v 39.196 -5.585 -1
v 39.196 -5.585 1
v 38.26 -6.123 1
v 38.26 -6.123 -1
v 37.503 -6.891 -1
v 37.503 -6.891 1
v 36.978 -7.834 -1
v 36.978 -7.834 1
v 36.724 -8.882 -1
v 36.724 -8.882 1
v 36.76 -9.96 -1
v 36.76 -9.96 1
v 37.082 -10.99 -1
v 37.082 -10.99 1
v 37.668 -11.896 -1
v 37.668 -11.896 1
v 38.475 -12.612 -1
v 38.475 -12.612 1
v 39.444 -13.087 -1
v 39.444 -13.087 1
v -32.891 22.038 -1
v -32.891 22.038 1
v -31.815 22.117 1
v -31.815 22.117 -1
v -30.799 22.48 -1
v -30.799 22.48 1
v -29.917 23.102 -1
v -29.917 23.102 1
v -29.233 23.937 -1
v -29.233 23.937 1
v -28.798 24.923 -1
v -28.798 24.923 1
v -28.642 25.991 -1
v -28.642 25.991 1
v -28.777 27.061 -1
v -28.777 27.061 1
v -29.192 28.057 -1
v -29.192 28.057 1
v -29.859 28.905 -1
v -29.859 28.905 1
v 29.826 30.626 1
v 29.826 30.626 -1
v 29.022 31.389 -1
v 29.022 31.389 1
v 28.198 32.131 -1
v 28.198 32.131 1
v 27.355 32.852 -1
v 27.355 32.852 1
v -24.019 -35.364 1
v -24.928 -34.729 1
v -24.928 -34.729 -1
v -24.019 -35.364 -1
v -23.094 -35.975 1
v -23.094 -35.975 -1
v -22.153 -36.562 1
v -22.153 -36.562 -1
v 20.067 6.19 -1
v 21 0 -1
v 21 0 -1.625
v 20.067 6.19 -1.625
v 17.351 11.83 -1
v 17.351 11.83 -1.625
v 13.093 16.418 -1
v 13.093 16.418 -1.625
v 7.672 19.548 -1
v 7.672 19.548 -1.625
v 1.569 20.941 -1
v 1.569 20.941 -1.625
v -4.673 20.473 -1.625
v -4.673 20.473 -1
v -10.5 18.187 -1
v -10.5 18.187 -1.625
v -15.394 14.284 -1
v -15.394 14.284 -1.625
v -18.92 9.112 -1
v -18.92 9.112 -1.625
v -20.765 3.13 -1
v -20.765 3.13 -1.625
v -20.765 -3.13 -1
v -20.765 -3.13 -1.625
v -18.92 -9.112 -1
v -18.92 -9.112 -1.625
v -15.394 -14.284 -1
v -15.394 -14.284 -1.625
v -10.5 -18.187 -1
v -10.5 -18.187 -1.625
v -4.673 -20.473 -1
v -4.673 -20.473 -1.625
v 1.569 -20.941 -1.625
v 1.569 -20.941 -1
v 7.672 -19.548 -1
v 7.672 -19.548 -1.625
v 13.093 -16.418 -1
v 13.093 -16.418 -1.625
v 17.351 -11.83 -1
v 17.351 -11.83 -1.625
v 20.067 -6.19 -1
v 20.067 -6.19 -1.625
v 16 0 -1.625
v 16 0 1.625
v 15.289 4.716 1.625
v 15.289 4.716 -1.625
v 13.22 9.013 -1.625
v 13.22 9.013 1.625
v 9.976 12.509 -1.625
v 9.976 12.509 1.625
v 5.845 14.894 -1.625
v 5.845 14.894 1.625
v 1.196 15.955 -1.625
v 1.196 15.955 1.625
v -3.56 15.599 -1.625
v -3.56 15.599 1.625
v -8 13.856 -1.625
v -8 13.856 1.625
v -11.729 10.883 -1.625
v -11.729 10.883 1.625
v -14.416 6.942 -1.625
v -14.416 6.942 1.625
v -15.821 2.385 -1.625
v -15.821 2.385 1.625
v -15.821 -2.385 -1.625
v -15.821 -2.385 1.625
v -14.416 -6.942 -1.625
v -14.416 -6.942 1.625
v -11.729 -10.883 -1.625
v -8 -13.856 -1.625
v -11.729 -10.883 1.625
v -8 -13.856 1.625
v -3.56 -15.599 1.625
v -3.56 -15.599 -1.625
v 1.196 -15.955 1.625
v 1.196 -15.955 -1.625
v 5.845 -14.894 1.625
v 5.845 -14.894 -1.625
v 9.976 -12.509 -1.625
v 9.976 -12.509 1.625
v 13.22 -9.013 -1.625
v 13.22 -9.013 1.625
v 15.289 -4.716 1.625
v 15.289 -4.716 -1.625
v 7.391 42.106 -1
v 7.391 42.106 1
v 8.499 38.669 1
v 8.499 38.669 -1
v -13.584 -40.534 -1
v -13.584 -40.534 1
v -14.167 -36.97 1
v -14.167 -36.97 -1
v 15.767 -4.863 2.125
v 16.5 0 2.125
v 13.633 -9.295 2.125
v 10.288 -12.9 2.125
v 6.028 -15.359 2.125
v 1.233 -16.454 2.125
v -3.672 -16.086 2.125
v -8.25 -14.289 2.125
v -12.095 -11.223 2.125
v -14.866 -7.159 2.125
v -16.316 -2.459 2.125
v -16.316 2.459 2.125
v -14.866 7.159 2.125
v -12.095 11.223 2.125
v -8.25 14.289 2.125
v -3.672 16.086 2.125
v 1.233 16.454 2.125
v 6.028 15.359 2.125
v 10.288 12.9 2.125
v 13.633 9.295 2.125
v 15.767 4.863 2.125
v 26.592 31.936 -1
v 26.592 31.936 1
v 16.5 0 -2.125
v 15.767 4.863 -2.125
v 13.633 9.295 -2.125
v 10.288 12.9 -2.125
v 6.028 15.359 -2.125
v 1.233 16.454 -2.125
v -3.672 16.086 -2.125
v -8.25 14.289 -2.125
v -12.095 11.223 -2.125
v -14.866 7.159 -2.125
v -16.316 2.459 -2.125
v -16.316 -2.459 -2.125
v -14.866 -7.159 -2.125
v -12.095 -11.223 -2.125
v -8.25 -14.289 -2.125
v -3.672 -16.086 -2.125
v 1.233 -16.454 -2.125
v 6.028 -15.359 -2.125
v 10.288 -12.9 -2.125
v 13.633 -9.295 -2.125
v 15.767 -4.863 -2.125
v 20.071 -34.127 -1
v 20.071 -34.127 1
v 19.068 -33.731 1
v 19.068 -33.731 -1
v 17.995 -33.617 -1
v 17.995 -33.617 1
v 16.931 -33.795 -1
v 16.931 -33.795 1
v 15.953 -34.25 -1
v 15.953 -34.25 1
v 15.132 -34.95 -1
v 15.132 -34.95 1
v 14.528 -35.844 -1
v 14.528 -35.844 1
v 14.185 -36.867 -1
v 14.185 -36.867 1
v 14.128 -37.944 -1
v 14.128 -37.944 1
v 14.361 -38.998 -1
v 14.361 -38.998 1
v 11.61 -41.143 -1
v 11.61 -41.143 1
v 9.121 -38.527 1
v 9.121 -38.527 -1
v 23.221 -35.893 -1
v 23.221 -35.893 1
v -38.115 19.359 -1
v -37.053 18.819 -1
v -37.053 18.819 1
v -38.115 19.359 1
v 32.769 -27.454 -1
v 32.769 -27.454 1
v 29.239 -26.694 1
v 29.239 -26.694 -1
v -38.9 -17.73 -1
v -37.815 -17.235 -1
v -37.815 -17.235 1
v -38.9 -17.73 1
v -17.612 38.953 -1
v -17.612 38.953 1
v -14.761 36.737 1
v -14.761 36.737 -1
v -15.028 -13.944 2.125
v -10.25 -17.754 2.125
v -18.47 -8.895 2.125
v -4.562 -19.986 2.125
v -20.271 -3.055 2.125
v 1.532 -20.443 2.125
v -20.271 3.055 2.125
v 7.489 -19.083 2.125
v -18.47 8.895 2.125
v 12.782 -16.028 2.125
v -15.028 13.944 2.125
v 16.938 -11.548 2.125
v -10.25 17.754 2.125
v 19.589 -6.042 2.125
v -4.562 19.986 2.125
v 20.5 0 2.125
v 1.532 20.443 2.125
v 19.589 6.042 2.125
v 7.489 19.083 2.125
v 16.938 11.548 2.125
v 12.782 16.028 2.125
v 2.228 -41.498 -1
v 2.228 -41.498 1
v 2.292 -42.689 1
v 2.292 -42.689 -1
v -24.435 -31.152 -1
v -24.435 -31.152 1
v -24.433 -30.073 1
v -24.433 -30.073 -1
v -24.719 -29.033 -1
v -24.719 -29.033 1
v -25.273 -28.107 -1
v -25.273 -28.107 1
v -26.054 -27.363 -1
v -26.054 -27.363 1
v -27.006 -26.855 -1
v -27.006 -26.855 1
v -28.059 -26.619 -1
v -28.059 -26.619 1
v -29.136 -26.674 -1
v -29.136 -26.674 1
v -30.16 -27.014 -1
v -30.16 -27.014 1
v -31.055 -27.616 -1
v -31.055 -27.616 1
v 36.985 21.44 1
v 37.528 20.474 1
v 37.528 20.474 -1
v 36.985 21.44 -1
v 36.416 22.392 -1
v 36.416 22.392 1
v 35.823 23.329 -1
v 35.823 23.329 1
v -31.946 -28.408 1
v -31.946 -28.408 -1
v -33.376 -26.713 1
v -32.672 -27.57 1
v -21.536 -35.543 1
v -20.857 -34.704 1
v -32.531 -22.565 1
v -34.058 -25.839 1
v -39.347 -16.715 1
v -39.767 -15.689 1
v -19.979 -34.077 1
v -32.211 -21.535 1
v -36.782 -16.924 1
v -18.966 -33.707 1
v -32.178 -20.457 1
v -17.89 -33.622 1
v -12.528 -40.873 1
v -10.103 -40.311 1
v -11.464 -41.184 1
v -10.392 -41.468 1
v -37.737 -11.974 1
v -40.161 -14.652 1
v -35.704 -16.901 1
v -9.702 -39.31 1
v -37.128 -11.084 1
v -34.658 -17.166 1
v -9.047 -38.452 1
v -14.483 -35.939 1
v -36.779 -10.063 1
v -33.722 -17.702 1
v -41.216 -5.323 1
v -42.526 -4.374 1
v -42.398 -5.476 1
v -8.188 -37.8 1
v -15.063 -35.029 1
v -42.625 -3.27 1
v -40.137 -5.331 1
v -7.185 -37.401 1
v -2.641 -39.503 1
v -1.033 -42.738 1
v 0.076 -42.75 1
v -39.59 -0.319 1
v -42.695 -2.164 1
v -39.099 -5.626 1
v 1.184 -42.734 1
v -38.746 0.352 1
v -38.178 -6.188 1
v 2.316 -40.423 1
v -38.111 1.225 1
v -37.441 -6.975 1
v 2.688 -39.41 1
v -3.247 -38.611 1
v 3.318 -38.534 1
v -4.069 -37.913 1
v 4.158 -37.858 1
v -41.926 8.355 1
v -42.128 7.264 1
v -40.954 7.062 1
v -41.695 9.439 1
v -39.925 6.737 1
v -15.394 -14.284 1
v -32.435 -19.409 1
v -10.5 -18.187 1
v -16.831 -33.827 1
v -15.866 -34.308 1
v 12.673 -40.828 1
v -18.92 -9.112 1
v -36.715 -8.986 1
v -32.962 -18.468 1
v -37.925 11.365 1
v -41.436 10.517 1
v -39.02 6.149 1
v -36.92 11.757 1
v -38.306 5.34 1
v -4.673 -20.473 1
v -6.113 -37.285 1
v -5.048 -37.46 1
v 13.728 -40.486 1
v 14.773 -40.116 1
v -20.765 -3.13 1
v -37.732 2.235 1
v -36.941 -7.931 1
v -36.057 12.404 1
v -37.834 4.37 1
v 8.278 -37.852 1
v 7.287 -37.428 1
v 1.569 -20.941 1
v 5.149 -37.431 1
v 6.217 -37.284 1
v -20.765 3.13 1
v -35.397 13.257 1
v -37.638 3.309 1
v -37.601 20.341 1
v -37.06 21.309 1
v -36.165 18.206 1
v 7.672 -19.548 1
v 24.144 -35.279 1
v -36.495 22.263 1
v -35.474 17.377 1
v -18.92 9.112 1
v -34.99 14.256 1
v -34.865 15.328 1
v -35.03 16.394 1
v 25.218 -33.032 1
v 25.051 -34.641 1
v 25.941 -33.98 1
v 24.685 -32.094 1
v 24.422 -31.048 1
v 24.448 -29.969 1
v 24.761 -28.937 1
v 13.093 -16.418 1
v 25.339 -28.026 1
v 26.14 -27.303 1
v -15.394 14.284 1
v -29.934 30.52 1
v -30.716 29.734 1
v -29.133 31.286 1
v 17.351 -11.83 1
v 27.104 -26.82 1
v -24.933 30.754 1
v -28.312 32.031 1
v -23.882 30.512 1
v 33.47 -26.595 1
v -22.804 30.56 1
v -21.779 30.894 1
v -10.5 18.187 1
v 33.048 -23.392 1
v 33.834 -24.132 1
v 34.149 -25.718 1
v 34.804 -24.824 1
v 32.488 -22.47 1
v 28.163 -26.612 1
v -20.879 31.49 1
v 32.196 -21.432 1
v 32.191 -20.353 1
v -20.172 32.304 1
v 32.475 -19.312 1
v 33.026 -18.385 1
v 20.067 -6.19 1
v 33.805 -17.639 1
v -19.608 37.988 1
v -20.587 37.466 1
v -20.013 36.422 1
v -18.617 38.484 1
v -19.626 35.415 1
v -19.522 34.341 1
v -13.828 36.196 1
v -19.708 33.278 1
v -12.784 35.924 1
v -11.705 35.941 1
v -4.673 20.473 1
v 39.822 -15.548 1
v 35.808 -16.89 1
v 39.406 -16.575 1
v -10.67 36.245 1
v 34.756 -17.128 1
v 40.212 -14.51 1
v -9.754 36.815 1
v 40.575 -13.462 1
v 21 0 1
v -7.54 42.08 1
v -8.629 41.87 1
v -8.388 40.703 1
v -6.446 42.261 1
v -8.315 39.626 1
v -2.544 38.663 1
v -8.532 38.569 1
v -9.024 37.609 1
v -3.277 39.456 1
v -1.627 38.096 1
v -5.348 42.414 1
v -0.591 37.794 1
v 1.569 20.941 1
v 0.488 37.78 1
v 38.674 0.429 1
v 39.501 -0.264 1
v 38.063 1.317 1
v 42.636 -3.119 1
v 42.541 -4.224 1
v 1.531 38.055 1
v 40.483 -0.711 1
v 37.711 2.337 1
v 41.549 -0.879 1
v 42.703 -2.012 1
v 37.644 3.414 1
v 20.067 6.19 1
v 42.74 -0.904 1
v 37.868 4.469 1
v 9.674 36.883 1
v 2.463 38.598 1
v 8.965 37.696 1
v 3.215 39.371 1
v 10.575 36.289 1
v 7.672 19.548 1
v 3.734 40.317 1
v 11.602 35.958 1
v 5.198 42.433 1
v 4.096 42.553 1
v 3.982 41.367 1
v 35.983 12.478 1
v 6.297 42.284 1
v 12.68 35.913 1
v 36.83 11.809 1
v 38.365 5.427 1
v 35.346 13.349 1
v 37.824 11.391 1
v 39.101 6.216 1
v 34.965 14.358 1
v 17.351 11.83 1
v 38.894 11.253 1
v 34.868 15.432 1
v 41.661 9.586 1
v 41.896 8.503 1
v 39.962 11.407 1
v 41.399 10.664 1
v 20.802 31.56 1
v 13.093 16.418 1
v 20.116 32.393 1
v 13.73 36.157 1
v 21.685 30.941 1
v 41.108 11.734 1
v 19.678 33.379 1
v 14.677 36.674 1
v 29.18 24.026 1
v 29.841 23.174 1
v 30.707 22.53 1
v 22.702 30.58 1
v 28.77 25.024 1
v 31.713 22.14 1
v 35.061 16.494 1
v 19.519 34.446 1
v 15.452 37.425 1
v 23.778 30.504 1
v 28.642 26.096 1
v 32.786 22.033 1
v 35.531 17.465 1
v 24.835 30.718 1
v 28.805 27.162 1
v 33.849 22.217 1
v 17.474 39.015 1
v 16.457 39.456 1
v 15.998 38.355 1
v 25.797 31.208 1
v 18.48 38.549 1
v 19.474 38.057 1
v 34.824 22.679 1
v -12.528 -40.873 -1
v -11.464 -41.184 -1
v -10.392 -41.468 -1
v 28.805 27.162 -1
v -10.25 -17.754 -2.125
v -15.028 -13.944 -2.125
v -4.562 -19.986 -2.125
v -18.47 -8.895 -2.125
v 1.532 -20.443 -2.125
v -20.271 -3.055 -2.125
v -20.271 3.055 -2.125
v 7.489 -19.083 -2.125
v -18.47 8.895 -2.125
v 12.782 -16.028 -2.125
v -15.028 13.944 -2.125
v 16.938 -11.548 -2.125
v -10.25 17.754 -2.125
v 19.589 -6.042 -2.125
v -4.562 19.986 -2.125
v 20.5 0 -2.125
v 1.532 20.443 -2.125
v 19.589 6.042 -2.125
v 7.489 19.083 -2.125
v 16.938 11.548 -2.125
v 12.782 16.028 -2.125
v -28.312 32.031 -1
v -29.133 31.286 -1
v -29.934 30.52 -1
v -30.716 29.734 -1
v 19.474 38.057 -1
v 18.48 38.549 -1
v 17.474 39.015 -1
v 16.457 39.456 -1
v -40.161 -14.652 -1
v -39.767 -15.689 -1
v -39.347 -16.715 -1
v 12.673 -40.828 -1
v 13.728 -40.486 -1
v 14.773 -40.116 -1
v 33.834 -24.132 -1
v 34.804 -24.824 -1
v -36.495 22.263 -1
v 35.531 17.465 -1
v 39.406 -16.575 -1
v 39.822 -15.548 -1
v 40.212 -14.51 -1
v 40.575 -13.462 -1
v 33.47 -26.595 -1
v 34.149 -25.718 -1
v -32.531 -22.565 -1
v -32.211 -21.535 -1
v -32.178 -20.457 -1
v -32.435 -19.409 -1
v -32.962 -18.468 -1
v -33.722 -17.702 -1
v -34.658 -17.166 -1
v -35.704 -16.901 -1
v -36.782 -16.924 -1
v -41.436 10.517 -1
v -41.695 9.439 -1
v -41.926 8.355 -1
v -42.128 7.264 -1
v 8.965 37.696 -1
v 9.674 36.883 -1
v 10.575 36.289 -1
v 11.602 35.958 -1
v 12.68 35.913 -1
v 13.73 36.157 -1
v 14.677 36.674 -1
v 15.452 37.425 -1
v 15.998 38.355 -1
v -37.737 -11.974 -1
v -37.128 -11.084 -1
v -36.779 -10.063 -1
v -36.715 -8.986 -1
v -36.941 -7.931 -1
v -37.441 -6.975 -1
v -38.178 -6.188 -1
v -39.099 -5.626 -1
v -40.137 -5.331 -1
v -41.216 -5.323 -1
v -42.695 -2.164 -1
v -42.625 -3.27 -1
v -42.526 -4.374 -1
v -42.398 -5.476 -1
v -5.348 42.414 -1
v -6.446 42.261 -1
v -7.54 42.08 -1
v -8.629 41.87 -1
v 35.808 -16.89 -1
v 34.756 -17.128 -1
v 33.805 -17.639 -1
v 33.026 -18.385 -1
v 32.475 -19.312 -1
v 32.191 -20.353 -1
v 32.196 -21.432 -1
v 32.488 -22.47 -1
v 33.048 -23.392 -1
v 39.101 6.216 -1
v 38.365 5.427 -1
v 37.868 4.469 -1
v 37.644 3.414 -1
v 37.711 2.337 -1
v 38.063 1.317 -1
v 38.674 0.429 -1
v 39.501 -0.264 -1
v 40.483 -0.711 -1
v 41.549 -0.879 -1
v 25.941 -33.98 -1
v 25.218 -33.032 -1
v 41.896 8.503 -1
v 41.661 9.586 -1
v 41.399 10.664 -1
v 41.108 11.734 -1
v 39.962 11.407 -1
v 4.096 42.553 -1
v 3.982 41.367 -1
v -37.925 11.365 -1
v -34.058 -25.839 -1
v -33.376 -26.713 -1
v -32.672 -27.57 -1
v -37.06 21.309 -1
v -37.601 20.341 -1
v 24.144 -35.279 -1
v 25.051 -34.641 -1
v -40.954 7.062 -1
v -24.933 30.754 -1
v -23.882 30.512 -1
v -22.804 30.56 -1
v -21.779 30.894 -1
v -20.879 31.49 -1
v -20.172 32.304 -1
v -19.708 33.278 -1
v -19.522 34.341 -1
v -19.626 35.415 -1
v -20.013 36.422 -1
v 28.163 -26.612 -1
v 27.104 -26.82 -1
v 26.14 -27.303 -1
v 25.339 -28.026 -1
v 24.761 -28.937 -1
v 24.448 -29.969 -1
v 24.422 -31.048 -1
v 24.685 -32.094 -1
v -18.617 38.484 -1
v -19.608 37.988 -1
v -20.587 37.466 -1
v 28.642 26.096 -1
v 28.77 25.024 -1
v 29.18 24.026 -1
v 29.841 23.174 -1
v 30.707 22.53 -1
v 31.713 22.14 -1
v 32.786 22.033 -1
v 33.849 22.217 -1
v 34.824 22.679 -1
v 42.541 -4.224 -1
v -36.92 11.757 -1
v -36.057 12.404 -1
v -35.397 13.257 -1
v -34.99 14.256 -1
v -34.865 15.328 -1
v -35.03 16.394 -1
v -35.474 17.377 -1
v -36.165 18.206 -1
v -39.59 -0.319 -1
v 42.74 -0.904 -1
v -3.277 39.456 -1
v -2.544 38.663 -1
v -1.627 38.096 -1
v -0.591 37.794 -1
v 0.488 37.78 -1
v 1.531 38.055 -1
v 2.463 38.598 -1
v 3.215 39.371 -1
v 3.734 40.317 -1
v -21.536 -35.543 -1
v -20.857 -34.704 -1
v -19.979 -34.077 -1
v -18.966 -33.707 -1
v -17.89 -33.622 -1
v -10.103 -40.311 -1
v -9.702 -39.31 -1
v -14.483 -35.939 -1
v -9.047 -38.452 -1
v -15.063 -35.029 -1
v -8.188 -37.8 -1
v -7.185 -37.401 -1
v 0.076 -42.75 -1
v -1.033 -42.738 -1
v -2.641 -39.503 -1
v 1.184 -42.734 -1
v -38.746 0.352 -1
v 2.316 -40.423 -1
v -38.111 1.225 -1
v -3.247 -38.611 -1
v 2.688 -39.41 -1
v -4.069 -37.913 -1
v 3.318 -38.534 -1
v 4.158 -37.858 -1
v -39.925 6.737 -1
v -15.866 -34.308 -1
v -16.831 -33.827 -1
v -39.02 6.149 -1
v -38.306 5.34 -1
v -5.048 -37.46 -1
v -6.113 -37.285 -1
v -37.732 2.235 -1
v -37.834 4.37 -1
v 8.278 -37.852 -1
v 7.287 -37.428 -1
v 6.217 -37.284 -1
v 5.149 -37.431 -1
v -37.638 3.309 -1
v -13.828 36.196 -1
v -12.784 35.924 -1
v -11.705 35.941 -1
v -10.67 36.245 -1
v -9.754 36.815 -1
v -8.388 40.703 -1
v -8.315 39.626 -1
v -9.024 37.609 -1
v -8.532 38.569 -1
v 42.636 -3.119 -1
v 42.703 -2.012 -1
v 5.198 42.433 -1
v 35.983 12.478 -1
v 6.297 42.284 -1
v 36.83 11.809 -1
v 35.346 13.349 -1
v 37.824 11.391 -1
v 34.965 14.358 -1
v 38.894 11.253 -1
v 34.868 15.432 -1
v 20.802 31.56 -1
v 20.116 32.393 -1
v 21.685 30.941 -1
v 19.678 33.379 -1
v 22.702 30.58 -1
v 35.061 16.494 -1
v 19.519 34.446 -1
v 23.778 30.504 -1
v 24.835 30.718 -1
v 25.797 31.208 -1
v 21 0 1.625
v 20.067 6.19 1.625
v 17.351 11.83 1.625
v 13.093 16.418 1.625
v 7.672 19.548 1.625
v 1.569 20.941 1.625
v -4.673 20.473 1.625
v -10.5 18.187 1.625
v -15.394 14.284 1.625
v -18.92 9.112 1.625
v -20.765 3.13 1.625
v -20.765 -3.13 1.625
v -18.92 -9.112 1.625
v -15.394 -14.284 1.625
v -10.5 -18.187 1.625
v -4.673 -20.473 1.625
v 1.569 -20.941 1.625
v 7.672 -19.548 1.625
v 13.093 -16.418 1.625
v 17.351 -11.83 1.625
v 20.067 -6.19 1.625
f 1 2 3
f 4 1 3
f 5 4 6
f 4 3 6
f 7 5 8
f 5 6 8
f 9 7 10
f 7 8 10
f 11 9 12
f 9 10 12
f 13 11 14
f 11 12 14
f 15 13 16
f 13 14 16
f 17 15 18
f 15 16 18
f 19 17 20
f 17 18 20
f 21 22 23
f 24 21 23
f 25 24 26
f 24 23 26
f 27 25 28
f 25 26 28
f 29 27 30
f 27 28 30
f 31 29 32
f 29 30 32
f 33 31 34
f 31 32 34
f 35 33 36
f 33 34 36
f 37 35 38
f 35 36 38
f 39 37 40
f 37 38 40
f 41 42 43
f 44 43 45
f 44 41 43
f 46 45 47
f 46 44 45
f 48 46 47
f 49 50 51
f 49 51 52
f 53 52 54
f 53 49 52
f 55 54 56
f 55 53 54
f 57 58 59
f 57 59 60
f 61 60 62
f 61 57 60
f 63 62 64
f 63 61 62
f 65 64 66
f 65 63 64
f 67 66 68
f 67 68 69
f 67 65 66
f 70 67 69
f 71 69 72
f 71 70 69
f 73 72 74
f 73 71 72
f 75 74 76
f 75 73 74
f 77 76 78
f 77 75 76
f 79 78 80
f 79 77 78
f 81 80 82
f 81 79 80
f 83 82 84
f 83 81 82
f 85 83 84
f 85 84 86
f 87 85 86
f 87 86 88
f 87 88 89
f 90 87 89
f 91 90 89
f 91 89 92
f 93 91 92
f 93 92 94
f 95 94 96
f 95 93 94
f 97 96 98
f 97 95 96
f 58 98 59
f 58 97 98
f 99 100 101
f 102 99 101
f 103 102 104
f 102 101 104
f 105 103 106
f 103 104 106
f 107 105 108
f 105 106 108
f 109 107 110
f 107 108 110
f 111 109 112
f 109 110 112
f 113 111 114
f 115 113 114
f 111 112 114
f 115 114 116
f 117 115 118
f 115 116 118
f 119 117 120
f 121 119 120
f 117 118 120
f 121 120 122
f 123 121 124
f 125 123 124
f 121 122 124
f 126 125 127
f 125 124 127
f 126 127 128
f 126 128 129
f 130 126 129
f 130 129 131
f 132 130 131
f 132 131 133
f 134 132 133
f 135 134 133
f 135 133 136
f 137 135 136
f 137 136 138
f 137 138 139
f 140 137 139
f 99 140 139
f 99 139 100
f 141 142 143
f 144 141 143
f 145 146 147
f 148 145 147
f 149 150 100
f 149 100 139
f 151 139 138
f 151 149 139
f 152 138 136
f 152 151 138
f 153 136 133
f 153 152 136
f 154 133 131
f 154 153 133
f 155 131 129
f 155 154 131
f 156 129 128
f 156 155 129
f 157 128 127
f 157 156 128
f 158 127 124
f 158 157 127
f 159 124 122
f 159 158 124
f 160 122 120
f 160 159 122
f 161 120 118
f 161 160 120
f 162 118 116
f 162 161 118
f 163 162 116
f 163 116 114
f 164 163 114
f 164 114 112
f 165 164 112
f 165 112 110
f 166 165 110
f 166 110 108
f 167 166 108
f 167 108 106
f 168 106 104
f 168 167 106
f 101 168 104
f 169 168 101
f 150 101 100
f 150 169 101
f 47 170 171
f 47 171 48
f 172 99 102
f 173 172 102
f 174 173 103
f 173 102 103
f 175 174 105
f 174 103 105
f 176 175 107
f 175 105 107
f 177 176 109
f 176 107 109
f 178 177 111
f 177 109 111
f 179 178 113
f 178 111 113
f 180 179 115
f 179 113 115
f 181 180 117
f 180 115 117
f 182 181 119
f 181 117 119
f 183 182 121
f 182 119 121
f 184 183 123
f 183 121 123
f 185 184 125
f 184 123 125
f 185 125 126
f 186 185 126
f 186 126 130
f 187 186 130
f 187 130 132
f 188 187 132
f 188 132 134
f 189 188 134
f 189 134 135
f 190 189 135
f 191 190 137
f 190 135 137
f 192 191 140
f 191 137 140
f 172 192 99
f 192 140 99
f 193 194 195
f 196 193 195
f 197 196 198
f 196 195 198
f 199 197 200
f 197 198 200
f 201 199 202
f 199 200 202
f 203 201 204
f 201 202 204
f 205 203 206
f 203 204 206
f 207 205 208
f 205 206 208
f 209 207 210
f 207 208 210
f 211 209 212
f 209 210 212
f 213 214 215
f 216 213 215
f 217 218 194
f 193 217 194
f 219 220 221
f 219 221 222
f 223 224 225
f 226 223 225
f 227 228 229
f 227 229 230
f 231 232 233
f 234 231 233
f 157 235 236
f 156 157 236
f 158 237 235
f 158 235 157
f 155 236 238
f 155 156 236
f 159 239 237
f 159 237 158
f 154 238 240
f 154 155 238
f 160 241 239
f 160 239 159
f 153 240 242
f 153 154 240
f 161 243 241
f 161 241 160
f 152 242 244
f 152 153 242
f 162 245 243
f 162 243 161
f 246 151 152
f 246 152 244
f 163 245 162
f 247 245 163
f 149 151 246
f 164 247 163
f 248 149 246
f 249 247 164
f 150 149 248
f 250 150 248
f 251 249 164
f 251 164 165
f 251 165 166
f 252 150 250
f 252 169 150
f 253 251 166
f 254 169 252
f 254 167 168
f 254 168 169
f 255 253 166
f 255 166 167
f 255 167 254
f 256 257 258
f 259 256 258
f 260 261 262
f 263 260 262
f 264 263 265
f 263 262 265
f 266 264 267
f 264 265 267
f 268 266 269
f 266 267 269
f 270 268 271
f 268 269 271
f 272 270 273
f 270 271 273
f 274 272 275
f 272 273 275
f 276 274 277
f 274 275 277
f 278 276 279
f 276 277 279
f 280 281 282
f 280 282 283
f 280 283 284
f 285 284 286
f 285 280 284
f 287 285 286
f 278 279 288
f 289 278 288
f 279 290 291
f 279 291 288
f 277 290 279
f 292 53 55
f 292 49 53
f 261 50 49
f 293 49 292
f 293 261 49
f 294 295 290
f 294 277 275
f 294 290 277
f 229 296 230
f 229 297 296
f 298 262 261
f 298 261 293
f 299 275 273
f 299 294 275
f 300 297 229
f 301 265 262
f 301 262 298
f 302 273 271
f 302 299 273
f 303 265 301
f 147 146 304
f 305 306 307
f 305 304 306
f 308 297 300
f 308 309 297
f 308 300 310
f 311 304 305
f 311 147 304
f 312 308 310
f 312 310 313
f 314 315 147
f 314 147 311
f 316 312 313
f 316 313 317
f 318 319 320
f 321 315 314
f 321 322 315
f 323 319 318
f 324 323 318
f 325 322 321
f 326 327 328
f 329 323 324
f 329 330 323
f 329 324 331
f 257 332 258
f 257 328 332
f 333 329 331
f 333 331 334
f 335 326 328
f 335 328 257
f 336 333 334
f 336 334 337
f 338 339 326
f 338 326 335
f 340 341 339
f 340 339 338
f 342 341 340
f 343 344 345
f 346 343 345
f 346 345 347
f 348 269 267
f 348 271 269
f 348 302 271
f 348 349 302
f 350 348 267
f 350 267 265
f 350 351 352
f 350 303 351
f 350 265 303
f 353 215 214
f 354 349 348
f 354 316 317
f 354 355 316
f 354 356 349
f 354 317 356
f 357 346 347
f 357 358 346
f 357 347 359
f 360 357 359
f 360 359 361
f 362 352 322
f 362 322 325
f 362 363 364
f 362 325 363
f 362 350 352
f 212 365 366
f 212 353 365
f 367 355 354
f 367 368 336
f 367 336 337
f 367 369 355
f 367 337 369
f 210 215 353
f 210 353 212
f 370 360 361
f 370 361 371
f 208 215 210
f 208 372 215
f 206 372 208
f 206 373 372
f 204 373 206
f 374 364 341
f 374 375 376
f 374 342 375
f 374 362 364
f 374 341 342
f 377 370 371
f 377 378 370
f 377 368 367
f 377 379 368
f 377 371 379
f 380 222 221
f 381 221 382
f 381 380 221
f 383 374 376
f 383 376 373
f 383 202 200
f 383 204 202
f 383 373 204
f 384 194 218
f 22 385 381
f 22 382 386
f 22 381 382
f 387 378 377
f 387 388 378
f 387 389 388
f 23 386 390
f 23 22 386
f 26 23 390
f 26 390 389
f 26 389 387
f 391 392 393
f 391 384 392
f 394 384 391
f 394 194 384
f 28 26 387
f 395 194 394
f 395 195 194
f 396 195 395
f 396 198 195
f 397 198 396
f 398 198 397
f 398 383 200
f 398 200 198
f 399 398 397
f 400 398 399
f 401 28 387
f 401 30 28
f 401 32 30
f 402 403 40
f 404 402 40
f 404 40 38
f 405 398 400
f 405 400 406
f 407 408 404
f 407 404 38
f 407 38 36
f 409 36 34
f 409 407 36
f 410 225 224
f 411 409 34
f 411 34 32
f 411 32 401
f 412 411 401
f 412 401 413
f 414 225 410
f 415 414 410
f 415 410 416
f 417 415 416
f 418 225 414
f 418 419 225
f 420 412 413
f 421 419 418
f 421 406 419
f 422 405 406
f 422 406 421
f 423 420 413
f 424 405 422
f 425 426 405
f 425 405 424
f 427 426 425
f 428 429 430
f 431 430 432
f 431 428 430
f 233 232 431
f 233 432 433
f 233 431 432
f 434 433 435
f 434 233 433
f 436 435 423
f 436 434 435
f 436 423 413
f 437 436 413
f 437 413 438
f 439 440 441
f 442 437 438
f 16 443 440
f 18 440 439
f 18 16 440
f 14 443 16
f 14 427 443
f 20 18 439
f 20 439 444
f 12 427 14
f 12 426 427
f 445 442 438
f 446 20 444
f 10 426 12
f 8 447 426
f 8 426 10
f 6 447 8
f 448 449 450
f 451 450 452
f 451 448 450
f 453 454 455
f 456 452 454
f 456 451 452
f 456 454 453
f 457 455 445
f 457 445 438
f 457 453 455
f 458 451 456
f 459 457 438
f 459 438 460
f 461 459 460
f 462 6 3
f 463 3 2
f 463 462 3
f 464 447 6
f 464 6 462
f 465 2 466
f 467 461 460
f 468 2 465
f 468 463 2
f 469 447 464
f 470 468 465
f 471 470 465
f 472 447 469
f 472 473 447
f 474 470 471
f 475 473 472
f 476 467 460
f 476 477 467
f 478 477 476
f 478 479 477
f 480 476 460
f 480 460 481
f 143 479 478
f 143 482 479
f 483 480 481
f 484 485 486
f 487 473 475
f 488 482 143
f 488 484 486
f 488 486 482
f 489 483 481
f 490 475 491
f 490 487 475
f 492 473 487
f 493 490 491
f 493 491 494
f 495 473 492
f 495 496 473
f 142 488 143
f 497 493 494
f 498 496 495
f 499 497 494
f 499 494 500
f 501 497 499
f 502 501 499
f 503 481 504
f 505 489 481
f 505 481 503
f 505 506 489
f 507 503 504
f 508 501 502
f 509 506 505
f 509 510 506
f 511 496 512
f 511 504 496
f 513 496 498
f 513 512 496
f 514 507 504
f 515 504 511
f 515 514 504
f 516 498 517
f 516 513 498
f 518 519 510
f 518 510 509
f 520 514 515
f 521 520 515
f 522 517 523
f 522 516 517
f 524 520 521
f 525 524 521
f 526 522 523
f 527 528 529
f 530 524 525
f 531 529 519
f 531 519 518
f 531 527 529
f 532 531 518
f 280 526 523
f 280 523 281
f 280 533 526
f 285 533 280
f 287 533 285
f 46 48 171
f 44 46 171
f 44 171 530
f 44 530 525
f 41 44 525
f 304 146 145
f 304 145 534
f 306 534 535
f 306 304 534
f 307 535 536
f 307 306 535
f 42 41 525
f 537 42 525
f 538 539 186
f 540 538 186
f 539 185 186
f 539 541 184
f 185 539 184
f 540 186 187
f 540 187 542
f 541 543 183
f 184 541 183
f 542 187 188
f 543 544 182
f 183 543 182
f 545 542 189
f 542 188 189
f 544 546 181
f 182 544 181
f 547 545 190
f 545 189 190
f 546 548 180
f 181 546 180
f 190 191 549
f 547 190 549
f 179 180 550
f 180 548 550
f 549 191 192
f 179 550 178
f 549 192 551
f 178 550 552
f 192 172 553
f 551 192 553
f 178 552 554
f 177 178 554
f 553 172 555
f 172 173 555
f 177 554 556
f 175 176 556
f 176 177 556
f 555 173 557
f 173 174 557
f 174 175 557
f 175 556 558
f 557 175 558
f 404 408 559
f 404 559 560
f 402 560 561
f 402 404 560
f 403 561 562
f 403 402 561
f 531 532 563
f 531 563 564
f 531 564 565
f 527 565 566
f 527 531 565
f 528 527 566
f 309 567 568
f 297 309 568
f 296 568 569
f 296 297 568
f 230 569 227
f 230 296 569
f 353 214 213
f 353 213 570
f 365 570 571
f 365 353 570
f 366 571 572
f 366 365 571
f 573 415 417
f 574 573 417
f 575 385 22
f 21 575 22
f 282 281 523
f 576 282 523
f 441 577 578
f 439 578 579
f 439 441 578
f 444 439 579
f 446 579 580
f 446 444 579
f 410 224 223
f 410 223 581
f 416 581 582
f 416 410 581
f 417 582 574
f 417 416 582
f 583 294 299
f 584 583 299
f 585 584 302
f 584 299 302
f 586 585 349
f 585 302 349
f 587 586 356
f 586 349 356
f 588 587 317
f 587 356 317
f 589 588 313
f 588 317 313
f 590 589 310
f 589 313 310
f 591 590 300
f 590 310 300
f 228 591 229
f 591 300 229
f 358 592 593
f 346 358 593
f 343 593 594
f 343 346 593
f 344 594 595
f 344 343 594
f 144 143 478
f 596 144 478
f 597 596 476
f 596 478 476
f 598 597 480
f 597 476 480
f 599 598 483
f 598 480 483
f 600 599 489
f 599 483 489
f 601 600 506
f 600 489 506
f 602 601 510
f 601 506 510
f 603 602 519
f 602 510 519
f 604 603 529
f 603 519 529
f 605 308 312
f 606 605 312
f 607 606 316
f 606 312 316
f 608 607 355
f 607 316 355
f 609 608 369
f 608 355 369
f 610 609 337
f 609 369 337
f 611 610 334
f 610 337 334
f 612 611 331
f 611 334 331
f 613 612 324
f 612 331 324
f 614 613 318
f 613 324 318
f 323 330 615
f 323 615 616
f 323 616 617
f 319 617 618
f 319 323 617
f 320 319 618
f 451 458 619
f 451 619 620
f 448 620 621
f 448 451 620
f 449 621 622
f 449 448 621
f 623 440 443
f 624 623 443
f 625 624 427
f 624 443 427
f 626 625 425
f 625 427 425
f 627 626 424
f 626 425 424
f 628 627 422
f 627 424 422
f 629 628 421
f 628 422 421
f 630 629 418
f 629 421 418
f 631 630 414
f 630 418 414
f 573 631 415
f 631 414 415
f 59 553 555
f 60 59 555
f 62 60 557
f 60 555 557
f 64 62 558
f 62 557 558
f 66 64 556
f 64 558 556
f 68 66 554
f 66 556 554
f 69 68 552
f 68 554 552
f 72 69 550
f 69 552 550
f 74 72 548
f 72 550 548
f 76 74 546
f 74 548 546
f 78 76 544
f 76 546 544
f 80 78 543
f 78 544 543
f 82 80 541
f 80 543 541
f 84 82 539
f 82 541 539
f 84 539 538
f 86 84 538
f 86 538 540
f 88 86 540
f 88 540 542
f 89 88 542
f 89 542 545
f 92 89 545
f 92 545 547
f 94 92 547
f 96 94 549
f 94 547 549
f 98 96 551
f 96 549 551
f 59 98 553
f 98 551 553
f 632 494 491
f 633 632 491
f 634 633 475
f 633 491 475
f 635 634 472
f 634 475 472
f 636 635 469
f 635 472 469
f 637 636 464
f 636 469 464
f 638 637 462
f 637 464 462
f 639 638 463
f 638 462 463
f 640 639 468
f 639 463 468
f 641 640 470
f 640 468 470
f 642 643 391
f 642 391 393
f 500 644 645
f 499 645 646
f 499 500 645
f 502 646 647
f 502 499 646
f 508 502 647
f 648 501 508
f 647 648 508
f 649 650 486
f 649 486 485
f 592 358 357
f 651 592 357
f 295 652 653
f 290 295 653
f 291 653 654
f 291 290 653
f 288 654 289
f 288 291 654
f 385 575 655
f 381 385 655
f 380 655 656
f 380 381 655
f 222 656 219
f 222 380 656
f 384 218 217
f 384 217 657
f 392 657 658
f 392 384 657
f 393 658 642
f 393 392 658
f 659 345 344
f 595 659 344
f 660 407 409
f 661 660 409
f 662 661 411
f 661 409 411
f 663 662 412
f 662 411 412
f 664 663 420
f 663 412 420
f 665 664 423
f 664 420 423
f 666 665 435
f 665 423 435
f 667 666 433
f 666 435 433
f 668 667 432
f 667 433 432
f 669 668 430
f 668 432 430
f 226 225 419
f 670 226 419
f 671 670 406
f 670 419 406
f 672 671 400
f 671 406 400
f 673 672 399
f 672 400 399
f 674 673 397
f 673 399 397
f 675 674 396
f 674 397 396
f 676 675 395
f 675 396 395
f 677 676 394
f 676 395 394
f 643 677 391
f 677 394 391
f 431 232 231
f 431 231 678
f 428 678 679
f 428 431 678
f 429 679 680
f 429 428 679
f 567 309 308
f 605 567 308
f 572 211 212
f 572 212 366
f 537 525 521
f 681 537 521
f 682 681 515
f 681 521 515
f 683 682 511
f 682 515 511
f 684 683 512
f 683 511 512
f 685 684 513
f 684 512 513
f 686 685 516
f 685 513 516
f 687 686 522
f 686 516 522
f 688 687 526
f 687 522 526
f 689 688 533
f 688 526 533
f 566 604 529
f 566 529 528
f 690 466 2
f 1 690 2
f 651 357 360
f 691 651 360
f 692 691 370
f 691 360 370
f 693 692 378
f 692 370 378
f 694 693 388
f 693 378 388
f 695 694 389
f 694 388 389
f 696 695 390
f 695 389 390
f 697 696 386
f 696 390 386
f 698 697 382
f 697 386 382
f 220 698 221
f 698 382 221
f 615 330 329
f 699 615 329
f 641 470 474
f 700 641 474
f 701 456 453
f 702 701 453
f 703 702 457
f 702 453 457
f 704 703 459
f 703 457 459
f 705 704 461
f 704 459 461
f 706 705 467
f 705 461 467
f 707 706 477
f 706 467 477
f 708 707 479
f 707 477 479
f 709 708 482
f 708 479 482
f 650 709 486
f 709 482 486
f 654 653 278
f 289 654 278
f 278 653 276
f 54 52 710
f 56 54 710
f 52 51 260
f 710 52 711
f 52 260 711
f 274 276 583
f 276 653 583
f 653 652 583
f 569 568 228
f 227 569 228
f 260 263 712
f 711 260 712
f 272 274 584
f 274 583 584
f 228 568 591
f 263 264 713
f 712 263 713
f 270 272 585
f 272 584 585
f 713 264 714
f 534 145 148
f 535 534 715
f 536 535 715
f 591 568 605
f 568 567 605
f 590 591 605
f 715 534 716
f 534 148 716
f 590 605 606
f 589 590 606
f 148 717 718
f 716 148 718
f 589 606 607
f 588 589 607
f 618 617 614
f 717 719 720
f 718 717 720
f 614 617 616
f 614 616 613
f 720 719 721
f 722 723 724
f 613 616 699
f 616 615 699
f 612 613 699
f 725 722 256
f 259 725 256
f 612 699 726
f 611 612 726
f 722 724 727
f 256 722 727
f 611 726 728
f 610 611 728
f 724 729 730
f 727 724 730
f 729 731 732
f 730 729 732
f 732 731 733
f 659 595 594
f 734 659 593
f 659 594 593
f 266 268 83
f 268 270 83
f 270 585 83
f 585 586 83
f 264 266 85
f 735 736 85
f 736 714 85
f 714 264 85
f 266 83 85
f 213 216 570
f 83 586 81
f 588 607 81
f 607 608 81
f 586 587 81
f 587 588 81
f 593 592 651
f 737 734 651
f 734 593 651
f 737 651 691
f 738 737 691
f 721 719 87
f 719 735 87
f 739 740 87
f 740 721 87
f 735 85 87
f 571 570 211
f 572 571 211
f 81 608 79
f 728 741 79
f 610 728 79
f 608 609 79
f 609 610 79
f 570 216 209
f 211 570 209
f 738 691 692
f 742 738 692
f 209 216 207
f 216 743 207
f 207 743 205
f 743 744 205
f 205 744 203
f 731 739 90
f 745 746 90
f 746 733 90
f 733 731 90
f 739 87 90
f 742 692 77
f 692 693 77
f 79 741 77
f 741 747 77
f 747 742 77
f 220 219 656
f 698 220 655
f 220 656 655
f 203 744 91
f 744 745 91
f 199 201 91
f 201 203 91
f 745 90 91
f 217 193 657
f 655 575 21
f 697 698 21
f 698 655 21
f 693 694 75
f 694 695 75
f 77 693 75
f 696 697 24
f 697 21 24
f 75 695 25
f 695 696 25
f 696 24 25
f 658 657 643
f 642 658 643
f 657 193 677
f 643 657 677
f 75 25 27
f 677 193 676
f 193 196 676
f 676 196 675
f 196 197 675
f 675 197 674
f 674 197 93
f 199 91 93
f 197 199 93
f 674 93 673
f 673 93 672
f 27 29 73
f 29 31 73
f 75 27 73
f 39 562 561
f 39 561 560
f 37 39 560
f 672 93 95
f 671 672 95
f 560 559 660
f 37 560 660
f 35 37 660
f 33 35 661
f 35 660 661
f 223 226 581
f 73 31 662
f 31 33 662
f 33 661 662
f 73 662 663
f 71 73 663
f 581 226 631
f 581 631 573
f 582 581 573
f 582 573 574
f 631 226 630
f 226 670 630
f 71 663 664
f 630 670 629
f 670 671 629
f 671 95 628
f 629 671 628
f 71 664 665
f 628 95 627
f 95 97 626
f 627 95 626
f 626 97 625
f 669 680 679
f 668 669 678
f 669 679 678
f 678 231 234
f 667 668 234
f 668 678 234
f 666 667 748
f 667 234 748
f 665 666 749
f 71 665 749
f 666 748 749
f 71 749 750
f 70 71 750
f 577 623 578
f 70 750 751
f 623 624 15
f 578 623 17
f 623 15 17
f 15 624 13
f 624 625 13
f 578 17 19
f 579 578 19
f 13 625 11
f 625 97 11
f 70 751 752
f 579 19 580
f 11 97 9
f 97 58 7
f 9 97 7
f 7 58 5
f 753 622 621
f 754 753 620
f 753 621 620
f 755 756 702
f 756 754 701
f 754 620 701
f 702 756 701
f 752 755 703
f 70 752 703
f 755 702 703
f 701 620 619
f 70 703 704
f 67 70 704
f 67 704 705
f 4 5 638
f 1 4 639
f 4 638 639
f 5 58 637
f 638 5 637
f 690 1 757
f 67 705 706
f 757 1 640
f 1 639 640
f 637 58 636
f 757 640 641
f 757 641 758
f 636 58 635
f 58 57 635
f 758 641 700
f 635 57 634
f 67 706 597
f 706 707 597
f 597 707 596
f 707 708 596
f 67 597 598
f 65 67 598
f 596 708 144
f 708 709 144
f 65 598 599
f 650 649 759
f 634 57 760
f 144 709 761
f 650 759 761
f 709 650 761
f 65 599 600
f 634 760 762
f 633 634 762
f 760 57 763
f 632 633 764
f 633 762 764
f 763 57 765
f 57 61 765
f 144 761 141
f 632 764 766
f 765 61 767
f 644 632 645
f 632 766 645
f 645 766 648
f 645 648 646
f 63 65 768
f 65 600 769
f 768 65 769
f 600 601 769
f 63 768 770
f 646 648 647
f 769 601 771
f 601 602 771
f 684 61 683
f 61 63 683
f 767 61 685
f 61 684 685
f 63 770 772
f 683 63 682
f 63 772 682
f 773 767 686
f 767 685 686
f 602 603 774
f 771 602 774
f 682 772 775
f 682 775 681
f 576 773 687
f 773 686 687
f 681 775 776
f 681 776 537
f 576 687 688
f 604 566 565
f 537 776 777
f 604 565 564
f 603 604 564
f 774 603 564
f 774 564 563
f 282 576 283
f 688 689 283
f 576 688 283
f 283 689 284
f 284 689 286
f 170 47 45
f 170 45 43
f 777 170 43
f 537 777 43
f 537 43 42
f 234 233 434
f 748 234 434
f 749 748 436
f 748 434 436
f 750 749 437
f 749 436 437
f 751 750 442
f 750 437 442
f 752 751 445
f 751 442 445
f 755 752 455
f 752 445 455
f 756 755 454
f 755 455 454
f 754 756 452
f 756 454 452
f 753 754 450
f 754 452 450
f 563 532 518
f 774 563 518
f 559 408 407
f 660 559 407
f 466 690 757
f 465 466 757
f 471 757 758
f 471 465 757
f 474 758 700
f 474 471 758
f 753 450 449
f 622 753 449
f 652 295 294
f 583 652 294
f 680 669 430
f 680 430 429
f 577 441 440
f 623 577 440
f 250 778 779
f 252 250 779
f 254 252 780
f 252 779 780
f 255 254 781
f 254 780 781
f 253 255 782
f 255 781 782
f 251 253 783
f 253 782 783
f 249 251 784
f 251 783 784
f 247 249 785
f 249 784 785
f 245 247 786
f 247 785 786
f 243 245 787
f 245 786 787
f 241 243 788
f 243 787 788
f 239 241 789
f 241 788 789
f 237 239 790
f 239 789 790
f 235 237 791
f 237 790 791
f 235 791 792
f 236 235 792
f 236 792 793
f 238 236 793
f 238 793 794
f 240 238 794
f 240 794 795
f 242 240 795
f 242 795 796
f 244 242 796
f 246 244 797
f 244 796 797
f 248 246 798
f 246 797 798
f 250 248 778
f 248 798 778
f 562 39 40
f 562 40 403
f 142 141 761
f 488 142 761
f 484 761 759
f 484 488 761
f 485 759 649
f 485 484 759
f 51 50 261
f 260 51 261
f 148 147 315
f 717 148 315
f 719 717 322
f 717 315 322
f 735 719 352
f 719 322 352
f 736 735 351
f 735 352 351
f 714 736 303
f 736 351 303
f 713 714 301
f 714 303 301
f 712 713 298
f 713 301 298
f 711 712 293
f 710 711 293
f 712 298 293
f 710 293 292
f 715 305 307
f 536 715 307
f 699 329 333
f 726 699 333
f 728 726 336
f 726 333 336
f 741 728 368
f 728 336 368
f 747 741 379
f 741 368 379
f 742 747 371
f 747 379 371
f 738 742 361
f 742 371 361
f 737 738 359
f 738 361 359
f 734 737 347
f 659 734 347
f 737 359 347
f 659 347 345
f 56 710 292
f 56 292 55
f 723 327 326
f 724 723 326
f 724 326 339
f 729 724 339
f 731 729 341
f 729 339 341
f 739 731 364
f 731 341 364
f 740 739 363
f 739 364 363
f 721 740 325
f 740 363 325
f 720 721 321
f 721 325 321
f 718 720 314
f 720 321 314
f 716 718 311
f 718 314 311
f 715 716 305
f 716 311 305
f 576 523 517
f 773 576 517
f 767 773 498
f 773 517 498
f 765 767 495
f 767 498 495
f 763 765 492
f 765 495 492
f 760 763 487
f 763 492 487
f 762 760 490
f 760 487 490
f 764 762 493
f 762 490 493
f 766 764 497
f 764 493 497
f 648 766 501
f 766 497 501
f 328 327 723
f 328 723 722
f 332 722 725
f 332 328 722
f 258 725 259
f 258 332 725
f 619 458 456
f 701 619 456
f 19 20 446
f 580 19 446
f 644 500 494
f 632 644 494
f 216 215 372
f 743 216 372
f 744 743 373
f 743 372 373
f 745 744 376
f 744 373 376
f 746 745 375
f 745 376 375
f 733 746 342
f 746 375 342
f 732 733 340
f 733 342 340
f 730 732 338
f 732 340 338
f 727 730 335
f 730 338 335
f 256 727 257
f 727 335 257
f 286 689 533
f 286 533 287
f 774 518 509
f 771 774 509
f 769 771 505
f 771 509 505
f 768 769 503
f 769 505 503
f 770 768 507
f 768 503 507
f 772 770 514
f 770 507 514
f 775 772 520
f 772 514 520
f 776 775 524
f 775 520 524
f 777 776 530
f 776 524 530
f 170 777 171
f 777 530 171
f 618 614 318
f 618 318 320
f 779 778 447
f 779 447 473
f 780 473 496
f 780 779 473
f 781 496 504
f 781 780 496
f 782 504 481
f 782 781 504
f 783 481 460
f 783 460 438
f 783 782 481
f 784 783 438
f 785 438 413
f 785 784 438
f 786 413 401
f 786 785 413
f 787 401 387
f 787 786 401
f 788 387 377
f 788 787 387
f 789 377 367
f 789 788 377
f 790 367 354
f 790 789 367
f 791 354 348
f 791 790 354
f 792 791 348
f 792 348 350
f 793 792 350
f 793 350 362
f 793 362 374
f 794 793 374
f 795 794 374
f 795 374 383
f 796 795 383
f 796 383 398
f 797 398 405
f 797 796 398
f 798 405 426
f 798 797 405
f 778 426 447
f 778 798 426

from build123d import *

# Parameters (mm, degrees)
ESQUISSE1_R                  = 42.75
EXTRUSION1_DEPTH             = 1
ENL_V_MAT_EXTRU_1_DEPTH      = 2
R_P_TITION_CIRCULAIRE1_COUNT = 21
ESQUISSE3_R                  = 21
EXTRUSION2_DEPTH             = 2.125
ESQUISSE4_R                  = 16
ENL_V_MAT_EXTRU_2_DEPTH      = 3.125
ENL_V_MAT_EXTRU_2_DEPTH_BACK = 3.125
CHANFREIN1_SIZE              = 0.5


with BuildPart() as part:
    # Esquisse1 → Extrusion1 (new body, symmetric)
    with BuildSketch(Plane.XY):
        Circle(ESQUISSE1_R)
    extrude(amount=EXTRUSION1_DEPTH, both=True)

    # Esquisse2 → Enlèv. mat.-Extru.1 (cut, symmetric)
    with BuildSketch(Plane.XY):
        with BuildLine():
            Line((-5.348139413, 42.414147461), (-3.276608177, 39.455694255))
            ThreePointArc((-3.276608177, 39.455694255), (1.018480402, 37.881835362), (3.981599184, 41.366766467))
            Line((3.981599184, 41.366766467), (4.095808383, 42.553341275))
            ThreePointArc((4.095808383, 42.553341275), (-0.630021414, 42.745357327), (-5.348139413, 42.414147461))
        make_face()
    enl_v_mat_extru_1 = extrude(amount=ENL_V_MAT_EXTRU_1_DEPTH, both=True, mode=Mode.SUBTRACT)

    # Répétition circulaire1: Enlèv. mat.-Extru.1 ×21 about axis
    r_p_tition_circulaire1_axis = Axis((0, 0, 0), (0, 0, 1))
    for i in range(1, R_P_TITION_CIRCULAIRE1_COUNT):
        add(enl_v_mat_extru_1.rotate(r_p_tition_circulaire1_axis, i * 360 / R_P_TITION_CIRCULAIRE1_COUNT), mode=Mode.SUBTRACT)

    # Esquisse3 → Extrusion2 (add, symmetric)
    with BuildSketch(Plane.XY):
        Circle(ESQUISSE3_R)
    extrude(amount=EXTRUSION2_DEPTH, both=True)

    # Esquisse4 → Enlèv. mat.-Extru.2 (cut, two sides)
    with BuildSketch(Plane.XY) as enl_v_mat_extru_2_sk:
        Circle(ESQUISSE4_R)
    extrude(amount=ENL_V_MAT_EXTRU_2_DEPTH, mode=Mode.SUBTRACT)
    extrude(enl_v_mat_extru_2_sk.sketch, amount=-ENL_V_MAT_EXTRU_2_DEPTH_BACK, mode=Mode.SUBTRACT)

    # Chanfrein1
    chanfrein1_edges = [part.edges().sort_by_distance(p)[0] for p in [
        (-21, 0, -2.125),
        (-21, 0, 2.125),
        (-16, 0, -2.125),
        (-16, 0, 2.125),
    ]]
    chamfer(chanfrein1_edges, length=CHANFREIN1_SIZE)


solid = part.part
